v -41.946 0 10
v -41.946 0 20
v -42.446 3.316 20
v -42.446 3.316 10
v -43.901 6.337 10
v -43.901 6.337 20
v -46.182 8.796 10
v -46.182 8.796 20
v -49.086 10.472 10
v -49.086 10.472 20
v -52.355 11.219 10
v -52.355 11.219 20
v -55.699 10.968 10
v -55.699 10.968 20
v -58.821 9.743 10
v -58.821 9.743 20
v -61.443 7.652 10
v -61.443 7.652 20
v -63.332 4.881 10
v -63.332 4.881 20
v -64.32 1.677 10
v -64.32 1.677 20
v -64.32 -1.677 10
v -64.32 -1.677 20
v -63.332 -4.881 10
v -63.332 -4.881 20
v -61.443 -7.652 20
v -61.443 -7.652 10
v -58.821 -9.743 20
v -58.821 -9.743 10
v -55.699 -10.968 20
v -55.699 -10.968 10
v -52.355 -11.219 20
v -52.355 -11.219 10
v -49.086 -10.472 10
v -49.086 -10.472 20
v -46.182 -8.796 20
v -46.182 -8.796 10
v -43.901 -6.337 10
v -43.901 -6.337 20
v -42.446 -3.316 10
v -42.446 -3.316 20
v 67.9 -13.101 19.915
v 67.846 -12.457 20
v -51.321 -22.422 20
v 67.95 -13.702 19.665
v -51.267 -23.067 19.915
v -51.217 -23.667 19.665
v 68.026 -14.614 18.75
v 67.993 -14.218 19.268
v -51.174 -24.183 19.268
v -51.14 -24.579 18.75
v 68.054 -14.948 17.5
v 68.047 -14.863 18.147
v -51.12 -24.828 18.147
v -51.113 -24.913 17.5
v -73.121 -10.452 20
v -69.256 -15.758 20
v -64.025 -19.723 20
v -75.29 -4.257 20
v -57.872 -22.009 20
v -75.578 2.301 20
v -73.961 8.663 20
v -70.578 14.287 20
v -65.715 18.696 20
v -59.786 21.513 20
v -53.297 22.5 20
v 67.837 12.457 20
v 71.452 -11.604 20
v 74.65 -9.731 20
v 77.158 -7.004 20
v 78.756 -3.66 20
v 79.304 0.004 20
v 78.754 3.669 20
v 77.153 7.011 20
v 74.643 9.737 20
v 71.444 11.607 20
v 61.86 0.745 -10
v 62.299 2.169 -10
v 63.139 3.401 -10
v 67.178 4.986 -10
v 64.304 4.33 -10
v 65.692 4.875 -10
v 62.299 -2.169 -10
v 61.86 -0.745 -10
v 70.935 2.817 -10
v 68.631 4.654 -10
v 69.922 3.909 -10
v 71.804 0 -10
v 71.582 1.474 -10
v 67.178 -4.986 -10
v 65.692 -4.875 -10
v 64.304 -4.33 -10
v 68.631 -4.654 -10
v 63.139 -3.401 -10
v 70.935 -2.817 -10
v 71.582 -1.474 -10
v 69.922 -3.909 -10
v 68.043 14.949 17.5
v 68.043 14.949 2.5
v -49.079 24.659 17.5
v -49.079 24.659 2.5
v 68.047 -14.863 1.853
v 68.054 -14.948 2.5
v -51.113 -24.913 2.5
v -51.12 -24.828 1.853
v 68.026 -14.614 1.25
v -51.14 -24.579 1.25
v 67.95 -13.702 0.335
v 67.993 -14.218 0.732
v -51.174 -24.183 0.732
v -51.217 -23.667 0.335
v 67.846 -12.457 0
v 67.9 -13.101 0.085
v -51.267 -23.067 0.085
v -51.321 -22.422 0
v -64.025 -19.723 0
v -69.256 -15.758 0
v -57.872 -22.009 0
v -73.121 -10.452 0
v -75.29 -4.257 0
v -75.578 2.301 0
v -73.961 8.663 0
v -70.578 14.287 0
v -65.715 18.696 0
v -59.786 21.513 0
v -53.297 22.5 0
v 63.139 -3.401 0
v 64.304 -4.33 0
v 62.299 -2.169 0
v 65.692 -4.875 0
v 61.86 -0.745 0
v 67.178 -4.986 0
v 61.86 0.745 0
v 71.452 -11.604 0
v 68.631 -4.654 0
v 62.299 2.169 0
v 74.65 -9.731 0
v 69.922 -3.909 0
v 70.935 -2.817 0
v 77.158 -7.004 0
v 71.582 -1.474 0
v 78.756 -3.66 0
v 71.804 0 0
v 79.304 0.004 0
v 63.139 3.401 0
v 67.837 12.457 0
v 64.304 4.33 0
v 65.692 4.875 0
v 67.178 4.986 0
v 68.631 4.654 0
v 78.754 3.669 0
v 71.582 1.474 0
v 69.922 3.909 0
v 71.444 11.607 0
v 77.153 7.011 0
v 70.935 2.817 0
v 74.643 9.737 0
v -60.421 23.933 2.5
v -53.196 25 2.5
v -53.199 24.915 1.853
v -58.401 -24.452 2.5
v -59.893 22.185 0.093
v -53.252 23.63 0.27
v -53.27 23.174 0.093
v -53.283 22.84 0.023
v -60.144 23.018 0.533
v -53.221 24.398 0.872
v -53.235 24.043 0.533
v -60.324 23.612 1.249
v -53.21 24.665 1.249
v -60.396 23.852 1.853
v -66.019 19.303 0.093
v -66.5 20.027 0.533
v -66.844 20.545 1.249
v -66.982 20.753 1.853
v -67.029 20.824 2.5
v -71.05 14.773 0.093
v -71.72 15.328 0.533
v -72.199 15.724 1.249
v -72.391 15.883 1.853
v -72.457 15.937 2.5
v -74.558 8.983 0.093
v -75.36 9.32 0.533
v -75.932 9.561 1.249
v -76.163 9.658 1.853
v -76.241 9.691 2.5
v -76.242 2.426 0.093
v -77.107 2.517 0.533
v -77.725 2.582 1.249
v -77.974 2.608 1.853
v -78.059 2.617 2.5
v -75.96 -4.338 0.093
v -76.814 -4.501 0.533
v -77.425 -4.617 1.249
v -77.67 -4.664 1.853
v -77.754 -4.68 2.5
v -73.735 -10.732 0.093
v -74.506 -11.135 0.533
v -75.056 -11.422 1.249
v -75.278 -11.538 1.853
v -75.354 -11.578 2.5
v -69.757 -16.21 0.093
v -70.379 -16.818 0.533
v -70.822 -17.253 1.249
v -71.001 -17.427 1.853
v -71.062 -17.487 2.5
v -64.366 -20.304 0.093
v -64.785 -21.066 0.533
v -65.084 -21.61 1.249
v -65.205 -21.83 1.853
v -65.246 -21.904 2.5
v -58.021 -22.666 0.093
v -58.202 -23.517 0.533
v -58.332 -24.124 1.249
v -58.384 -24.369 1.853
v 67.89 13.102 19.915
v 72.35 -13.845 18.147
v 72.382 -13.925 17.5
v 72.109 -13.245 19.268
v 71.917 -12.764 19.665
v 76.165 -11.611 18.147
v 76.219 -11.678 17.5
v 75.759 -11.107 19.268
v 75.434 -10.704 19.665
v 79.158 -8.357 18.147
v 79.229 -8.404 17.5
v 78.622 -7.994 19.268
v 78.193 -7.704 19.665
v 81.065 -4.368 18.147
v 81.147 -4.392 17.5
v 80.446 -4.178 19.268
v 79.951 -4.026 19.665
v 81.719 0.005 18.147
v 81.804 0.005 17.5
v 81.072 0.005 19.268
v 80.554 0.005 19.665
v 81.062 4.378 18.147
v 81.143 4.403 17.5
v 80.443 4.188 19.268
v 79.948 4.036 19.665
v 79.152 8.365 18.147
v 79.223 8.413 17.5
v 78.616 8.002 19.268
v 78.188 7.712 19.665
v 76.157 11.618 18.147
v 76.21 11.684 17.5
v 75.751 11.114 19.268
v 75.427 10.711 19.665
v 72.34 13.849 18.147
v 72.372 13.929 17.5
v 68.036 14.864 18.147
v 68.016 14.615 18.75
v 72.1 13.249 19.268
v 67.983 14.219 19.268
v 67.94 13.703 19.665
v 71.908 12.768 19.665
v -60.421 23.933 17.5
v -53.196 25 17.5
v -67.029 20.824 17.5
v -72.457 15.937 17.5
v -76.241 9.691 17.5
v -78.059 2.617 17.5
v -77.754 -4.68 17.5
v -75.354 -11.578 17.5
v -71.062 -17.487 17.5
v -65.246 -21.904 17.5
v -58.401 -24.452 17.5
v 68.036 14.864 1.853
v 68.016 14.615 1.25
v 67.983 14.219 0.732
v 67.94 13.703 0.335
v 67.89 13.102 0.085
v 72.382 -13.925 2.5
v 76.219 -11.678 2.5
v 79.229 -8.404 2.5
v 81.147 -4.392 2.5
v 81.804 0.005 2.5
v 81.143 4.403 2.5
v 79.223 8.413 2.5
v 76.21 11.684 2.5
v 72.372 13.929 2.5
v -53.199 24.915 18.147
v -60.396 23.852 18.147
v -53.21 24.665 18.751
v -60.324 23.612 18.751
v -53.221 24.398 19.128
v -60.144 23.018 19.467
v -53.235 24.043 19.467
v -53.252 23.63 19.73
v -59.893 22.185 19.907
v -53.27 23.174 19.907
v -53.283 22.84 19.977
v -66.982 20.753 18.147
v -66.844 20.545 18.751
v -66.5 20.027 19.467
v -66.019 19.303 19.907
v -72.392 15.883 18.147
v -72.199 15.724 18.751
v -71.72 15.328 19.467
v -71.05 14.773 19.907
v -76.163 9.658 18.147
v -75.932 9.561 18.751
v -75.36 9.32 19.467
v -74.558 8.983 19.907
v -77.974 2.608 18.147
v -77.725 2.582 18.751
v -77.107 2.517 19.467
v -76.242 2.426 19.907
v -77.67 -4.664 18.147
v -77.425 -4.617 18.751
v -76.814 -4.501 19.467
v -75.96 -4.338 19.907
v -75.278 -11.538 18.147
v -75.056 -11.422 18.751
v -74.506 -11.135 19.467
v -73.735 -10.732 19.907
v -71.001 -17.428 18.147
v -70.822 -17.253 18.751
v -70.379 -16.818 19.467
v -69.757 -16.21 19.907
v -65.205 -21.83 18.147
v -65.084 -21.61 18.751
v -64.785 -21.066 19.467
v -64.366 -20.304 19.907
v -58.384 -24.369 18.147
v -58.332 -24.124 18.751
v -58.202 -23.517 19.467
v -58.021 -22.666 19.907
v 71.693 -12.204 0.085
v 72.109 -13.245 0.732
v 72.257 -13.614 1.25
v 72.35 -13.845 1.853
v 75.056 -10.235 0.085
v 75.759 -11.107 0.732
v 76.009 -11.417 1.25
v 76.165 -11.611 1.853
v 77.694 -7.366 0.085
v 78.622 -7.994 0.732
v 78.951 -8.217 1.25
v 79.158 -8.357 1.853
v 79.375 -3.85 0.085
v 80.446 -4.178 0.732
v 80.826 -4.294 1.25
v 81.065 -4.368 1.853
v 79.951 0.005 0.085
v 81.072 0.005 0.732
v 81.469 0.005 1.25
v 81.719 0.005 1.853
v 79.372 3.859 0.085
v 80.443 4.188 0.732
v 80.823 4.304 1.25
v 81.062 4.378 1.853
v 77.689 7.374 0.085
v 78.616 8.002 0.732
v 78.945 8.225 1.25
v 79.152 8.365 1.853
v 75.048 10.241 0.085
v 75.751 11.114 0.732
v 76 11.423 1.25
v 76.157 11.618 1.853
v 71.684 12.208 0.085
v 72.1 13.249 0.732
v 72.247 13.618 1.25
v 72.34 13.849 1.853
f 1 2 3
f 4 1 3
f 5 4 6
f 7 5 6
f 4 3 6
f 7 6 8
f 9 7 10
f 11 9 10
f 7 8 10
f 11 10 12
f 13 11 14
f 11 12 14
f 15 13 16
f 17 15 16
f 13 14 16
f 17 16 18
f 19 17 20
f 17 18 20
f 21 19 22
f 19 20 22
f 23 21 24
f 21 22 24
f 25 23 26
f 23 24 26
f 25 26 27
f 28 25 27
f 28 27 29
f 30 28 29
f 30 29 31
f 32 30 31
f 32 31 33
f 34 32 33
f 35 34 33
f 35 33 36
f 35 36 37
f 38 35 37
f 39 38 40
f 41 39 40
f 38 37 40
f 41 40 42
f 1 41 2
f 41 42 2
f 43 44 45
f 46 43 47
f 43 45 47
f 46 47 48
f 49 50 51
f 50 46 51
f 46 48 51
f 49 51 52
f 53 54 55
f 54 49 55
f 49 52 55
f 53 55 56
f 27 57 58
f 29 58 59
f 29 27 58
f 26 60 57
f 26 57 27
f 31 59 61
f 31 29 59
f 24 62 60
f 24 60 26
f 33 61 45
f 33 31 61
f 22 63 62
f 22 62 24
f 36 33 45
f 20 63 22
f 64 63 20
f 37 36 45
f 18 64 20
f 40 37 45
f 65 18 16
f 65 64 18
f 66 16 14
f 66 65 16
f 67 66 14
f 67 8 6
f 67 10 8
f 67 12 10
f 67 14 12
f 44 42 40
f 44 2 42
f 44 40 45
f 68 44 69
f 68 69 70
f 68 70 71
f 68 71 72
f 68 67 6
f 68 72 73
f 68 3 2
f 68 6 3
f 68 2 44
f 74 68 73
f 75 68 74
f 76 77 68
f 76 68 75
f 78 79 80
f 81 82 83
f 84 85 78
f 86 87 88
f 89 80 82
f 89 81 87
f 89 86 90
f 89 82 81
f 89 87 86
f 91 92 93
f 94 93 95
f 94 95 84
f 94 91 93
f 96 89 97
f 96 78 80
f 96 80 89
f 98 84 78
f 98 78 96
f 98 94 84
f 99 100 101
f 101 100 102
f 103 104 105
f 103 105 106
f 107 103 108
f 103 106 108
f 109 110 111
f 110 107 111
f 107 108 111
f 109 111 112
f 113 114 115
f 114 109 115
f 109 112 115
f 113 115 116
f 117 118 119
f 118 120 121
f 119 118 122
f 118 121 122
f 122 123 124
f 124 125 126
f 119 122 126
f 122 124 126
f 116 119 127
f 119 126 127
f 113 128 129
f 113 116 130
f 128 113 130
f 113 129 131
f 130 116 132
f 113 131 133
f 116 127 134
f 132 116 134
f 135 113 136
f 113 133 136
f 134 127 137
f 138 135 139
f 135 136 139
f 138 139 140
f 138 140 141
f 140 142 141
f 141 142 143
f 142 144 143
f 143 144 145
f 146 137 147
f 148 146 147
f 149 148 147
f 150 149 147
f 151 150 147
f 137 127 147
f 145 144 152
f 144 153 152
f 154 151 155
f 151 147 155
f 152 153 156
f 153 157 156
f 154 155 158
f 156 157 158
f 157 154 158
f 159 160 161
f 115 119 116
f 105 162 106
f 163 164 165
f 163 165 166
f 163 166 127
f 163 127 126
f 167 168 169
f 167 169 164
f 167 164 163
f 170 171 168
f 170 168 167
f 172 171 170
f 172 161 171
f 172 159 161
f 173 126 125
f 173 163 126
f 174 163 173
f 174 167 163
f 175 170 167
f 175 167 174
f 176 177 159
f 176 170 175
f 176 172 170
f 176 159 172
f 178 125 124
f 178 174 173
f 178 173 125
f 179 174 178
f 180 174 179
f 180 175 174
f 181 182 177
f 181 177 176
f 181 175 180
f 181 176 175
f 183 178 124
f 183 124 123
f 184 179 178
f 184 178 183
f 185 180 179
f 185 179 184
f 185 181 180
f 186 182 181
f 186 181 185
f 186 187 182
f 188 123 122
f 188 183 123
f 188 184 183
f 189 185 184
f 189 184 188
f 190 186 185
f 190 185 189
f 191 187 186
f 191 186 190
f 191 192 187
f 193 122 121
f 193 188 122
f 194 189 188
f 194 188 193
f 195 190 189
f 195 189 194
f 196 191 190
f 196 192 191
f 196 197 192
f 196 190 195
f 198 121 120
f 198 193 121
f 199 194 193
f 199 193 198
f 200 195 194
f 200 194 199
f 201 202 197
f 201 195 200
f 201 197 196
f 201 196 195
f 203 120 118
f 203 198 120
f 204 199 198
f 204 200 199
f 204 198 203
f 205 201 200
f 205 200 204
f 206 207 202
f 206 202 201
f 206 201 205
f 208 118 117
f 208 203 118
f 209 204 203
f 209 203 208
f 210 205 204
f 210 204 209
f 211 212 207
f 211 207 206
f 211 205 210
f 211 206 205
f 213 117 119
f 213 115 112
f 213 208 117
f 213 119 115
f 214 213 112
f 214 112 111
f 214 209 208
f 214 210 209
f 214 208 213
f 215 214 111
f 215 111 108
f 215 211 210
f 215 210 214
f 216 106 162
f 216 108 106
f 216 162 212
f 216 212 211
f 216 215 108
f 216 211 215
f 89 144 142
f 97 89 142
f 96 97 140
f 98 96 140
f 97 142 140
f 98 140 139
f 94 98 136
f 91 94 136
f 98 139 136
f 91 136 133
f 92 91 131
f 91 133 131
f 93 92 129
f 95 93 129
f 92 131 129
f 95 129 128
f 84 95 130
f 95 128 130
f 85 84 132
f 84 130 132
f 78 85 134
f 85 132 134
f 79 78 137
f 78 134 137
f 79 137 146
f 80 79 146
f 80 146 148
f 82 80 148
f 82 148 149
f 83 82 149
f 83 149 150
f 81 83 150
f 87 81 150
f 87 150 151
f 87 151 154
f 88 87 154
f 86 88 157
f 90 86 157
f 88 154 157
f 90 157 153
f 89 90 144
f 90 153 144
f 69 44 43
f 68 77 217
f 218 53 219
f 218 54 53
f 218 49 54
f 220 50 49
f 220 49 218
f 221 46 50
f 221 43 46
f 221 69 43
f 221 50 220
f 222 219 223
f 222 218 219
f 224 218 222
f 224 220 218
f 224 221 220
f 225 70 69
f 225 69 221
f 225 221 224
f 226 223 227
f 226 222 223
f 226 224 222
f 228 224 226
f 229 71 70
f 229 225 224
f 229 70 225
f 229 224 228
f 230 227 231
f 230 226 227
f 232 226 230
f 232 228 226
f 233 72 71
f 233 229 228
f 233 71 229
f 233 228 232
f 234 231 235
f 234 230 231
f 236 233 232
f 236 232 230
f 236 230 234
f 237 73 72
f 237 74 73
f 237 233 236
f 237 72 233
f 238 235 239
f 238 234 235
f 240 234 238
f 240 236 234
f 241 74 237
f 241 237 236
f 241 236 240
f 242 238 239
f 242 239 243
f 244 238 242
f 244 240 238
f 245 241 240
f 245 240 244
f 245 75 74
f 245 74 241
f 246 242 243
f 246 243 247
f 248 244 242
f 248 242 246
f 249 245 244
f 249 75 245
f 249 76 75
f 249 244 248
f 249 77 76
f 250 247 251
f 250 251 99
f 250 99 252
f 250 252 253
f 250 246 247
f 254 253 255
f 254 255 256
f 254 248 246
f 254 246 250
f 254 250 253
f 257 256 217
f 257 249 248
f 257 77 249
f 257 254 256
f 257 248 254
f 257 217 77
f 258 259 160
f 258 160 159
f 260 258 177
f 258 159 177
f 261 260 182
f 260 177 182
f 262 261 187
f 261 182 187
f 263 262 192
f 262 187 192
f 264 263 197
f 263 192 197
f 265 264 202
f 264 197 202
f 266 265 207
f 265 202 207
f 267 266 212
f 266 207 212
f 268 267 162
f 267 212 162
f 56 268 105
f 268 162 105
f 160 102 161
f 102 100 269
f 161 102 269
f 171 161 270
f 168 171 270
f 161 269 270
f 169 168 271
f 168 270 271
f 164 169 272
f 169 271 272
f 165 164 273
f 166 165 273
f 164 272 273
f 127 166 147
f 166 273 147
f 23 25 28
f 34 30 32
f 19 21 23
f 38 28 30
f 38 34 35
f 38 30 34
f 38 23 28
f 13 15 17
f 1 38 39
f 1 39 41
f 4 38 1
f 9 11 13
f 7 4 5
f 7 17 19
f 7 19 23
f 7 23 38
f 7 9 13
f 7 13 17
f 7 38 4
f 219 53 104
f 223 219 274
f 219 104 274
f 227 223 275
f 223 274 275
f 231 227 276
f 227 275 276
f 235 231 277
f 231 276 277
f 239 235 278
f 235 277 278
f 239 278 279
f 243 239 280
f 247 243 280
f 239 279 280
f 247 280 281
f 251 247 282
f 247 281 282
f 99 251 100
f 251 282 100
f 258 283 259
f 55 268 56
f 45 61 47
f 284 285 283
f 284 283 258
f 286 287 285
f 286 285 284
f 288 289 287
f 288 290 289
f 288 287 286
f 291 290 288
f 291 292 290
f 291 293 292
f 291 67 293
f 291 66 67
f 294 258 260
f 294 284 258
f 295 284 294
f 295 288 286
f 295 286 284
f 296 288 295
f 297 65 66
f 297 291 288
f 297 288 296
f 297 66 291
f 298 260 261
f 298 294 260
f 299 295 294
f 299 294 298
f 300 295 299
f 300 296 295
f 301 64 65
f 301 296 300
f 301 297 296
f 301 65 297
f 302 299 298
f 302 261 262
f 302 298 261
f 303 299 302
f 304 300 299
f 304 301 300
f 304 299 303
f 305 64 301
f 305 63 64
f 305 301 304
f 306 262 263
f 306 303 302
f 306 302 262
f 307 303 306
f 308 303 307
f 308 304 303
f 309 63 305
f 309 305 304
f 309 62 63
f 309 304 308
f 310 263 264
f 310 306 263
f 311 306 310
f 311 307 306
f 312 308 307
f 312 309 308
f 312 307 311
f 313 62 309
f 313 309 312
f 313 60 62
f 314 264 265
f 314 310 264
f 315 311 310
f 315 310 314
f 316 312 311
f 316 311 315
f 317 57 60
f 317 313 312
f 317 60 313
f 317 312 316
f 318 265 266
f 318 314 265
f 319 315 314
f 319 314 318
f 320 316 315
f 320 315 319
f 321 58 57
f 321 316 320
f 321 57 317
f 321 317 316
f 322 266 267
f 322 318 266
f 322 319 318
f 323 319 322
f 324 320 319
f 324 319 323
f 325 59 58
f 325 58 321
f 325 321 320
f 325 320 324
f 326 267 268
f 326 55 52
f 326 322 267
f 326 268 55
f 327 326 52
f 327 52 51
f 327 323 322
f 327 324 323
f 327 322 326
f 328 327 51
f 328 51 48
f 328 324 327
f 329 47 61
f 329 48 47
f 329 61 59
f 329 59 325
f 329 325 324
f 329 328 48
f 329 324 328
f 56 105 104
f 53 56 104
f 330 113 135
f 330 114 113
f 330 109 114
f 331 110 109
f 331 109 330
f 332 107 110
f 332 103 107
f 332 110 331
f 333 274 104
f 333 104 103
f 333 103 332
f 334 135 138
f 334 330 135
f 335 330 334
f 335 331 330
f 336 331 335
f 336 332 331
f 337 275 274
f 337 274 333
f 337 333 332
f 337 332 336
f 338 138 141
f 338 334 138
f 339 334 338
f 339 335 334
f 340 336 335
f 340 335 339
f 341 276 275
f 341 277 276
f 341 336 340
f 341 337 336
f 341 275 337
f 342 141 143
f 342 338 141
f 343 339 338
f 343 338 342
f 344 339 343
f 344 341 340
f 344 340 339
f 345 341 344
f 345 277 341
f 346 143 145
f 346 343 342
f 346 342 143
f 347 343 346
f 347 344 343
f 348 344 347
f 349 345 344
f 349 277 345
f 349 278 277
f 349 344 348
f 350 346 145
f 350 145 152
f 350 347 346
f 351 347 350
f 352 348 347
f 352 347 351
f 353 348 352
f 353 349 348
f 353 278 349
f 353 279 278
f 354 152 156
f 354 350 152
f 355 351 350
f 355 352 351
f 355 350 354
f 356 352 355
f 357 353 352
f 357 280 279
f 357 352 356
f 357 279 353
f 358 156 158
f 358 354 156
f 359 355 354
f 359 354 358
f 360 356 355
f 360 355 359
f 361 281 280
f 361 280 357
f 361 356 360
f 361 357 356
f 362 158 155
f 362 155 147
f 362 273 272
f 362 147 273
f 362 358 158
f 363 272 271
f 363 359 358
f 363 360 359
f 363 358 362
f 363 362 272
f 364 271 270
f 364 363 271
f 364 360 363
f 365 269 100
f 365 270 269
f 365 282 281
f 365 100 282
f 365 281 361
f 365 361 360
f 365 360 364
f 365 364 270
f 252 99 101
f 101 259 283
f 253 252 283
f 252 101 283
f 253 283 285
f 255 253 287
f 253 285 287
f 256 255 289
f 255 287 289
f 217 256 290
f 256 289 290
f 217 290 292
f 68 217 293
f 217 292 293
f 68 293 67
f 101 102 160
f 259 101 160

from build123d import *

# Parameters (mm, degrees)
BOSS_EXTRUDE1_DEPTH = 20
SKETCH2_R           = 5
BOSS_EXTRUDE2_DEPTH = 10
SKETCH3_R           = 11.25
CUT_EXTRUDE1_DEPTH  = 10
FILLET1_R           = 2.5
FILLET2_R           = 2.5


with BuildPart() as part:
    # Sketch1 → Boss-Extrude1 (new body)
    with BuildSketch(Plane.XY):
        with BuildLine():
            Line((-49.078947743, 24.658688111), (-53.195876289, 25))
            ThreePointArc((-53.195876289, 25), (-78.174127632, -1.04257365), (-51.112542955, -24.913043215))
            Line((-51.112542955, -24.913043215), (68.054123711, -14.947825929))
            ThreePointArc((68.054123711, -14.947825929), (81.804122753, 0.005360617), (68.04343945, 14.948715547))
            Line((68.04343945, 14.948715547), (-49.078947743, 24.658688111))
        make_face()
    extrude(amount=BOSS_EXTRUDE1_DEPTH)

    # Sketch2 → Boss-Extrude2 (add)
    with BuildSketch(Plane(origin=(0, 0, 0), x_dir=(-1, 0, 0), z_dir=(0, 0, -1))):
        with Locations(Location((-66.804123711, 0, 0), (0, 0, 180))):
            Circle(SKETCH2_R)
    extrude(amount=BOSS_EXTRUDE2_DEPTH)

    # Sketch3 → Cut-Extrude1 (cut)
    with BuildSketch(Plane.XY.offset(20)):
        with Locations((-53.195876289, 0)):
            Circle(SKETCH3_R)
    extrude(amount=-CUT_EXTRUDE1_DEPTH, mode=Mode.SUBTRACT)

    # Fillet1
    # the kernel refuses this fillet: 2.5 mm, written as the material it takes off along each edge
    with BuildSketch(Plane(origin=(66.804123711, 0, 20), x_dir=(0.08333333333333336, -0.9965217285917832, 0), z_dir=(-0.9965217285917832, -0.08333333333333336, 0))) as fillet1_piece_1:
        with BuildLine():
            CenterArc((15 - FILLET1_R, -FILLET1_R), FILLET1_R, 0, 90)
            Line((15 - FILLET1_R, 0), (15 - FILLET1_R, FILLET1_R * 0.02))
            Line((15 - FILLET1_R, FILLET1_R * 0.02), (15 + FILLET1_R * 0.02, FILLET1_R * 0.02))
            Line((15 + FILLET1_R * 0.02, FILLET1_R * 0.02), (15 + FILLET1_R * 0.02, -FILLET1_R))
            Line((15 + FILLET1_R * 0.02, -FILLET1_R), (15, -FILLET1_R))
        make_face()
    revolve(axis=Axis((66.804123711, 0, 20), (0, 0, 1)), revolution_arc=170.480568403, mode=Mode.SUBTRACT)
    with BuildSketch(Plane(origin=(-55.68732888, 25.206552623, 20), x_dir=(-0.08262104926117214, -0.9965810364536258, 0), z_dir=(0.9965810364536258, -0.08262104926117214, 0))) as fillet1_piece_2:
        with BuildLine():
            CenterArc((FILLET1_R, FILLET1_R), FILLET1_R, 180, 90)
            Line((0, FILLET1_R), (-FILLET1_R * 0.02, FILLET1_R))
            Line((-FILLET1_R * 0.02, FILLET1_R), (-FILLET1_R * 0.02, -FILLET1_R * 0.02))
            Line((-FILLET1_R * 0.02, -FILLET1_R * 0.02), (FILLET1_R, -FILLET1_R * 0.02))
            Line((FILLET1_R, -FILLET1_R * 0.02), (FILLET1_R, 0))
        make_face()
    extrude(amount=124.155250606, mode=Mode.SUBTRACT)
    with BuildSketch(Plane(origin=(-53.195876289, 0, 20), x_dir=(0.10000205270336067, 0.994987230800031, 0), z_dir=(0.994987230800031, -0.10000205270336067, 0))) as fillet1_piece_3:
        with BuildLine():
            CenterArc((25 - FILLET1_R, -FILLET1_R), FILLET1_R, 0, 90)
            Line((25 - FILLET1_R, 0), (25 - FILLET1_R, FILLET1_R * 0.02))
            Line((25 - FILLET1_R, FILLET1_R * 0.02), (25 + FILLET1_R * 0.02, FILLET1_R * 0.02))
            Line((25 + FILLET1_R * 0.02, FILLET1_R * 0.02), (25 + FILLET1_R * 0.02, -FILLET1_R))
            Line((25 + FILLET1_R * 0.02, -FILLET1_R), (25, -FILLET1_R))
        make_face()
    revolve(axis=Axis((-53.195876289, 0, 20), (0, 0, 1)), revolution_arc=190.519480528, mode=Mode.SUBTRACT)
    with BuildSketch(Plane(origin=(-51.112542955, -24.913043215, 20), x_dir=(0, 0, -1), z_dir=(0.9965217285917832, 0.08333333333333336, 0))) as fillet1_piece_4:
        with BuildLine():
            CenterArc((FILLET1_R, FILLET1_R), FILLET1_R, 180, 90)
            Line((0, FILLET1_R), (-FILLET1_R * 0.02, FILLET1_R))
            Line((-FILLET1_R * 0.02, FILLET1_R), (-FILLET1_R * 0.02, -FILLET1_R * 0.02))
            Line((-FILLET1_R * 0.02, -FILLET1_R * 0.02), (FILLET1_R, -FILLET1_R * 0.02))
            Line((FILLET1_R, -FILLET1_R * 0.02), (FILLET1_R, 0))
        make_face()
    extrude(amount=119.582607431, mode=Mode.SUBTRACT)

    # Fillet2
    # the kernel refuses this fillet: 2.5 mm, written as the material it takes off along each edge
    with BuildSketch(Plane(origin=(-53.195876289, 0, 0), x_dir=(0.10000205270336067, 0.994987230800031, 0), z_dir=(0.994987230800031, -0.10000205270336067, 0))) as fillet2_piece_1:
        with BuildLine():
            CenterArc((25 - FILLET2_R, FILLET2_R), FILLET2_R, 270, 90)
            Line((25, FILLET2_R), (25 + FILLET2_R * 0.02, FILLET2_R))
            Line((25 + FILLET2_R * 0.02, FILLET2_R), (25 + FILLET2_R * 0.02, -FILLET2_R * 0.02))
            Line((25 + FILLET2_R * 0.02, -FILLET2_R * 0.02), (25 - FILLET2_R, -FILLET2_R * 0.02))
            Line((25 - FILLET2_R, -FILLET2_R * 0.02), (25 - FILLET2_R, 0))
        make_face()
    revolve(axis=Axis((-53.195876289, 0, 0), (0, 0, 1)), revolution_arc=190.519480528, mode=Mode.SUBTRACT)
    with BuildSketch(Plane(origin=(68.04343945, 14.948715547, 0), x_dir=(-0.08262104926117214, -0.9965810364536258, 0), z_dir=(-0.9965810364536258, 0.08262104926117214, 0))) as fillet2_piece_2:
        with BuildLine():
            CenterArc((FILLET2_R, FILLET2_R), FILLET2_R, 180, 90)
            Line((0, FILLET2_R), (-FILLET2_R * 0.02, FILLET2_R))
            Line((-FILLET2_R * 0.02, FILLET2_R), (-FILLET2_R * 0.02, -FILLET2_R * 0.02))
            Line((-FILLET2_R * 0.02, -FILLET2_R * 0.02), (FILLET2_R, -FILLET2_R * 0.02))
            Line((FILLET2_R, -FILLET2_R * 0.02), (FILLET2_R, 0))
        make_face()
    extrude(amount=124.155250606, mode=Mode.SUBTRACT)
    with BuildSketch(Plane(origin=(66.804123711, 0, 0), x_dir=(0.08333333333333336, -0.9965217285917832, 0), z_dir=(-0.9965217285917832, -0.08333333333333336, 0))) as fillet2_piece_3:
        with BuildLine():
            CenterArc((15 - FILLET2_R, FILLET2_R), FILLET2_R, 270, 90)
            Line((15, FILLET2_R), (15 + FILLET2_R * 0.02, FILLET2_R))
            Line((15 + FILLET2_R * 0.02, FILLET2_R), (15 + FILLET2_R * 0.02, -FILLET2_R * 0.02))
            Line((15 + FILLET2_R * 0.02, -FILLET2_R * 0.02), (15 - FILLET2_R, -FILLET2_R * 0.02))
            Line((15 - FILLET2_R, -FILLET2_R * 0.02), (15 - FILLET2_R, 0))
        make_face()
    revolve(axis=Axis((66.804123711, 0, 0), (0, 0, 1)), revolution_arc=170.480568403, mode=Mode.SUBTRACT)
    with BuildSketch(Plane(origin=(-51.112542955, -24.913043215, 0), x_dir=(0, 0, 1), z_dir=(0.9965217285917832, 0.08333333333333336, 0))) as fillet2_piece_4:
        with BuildLine():
            CenterArc((FILLET2_R, -FILLET2_R), FILLET2_R, 90, 90)
            Line((0, -FILLET2_R), (-FILLET2_R * 0.02, -FILLET2_R))
            Line((-FILLET2_R * 0.02, -FILLET2_R), (-FILLET2_R * 0.02, FILLET2_R * 0.02))
            Line((-FILLET2_R * 0.02, FILLET2_R * 0.02), (FILLET2_R, FILLET2_R * 0.02))
            Line((FILLET2_R, FILLET2_R * 0.02), (FILLET2_R, 0))
        make_face()
    extrude(amount=119.582607431, mode=Mode.SUBTRACT)


solid = part.part
